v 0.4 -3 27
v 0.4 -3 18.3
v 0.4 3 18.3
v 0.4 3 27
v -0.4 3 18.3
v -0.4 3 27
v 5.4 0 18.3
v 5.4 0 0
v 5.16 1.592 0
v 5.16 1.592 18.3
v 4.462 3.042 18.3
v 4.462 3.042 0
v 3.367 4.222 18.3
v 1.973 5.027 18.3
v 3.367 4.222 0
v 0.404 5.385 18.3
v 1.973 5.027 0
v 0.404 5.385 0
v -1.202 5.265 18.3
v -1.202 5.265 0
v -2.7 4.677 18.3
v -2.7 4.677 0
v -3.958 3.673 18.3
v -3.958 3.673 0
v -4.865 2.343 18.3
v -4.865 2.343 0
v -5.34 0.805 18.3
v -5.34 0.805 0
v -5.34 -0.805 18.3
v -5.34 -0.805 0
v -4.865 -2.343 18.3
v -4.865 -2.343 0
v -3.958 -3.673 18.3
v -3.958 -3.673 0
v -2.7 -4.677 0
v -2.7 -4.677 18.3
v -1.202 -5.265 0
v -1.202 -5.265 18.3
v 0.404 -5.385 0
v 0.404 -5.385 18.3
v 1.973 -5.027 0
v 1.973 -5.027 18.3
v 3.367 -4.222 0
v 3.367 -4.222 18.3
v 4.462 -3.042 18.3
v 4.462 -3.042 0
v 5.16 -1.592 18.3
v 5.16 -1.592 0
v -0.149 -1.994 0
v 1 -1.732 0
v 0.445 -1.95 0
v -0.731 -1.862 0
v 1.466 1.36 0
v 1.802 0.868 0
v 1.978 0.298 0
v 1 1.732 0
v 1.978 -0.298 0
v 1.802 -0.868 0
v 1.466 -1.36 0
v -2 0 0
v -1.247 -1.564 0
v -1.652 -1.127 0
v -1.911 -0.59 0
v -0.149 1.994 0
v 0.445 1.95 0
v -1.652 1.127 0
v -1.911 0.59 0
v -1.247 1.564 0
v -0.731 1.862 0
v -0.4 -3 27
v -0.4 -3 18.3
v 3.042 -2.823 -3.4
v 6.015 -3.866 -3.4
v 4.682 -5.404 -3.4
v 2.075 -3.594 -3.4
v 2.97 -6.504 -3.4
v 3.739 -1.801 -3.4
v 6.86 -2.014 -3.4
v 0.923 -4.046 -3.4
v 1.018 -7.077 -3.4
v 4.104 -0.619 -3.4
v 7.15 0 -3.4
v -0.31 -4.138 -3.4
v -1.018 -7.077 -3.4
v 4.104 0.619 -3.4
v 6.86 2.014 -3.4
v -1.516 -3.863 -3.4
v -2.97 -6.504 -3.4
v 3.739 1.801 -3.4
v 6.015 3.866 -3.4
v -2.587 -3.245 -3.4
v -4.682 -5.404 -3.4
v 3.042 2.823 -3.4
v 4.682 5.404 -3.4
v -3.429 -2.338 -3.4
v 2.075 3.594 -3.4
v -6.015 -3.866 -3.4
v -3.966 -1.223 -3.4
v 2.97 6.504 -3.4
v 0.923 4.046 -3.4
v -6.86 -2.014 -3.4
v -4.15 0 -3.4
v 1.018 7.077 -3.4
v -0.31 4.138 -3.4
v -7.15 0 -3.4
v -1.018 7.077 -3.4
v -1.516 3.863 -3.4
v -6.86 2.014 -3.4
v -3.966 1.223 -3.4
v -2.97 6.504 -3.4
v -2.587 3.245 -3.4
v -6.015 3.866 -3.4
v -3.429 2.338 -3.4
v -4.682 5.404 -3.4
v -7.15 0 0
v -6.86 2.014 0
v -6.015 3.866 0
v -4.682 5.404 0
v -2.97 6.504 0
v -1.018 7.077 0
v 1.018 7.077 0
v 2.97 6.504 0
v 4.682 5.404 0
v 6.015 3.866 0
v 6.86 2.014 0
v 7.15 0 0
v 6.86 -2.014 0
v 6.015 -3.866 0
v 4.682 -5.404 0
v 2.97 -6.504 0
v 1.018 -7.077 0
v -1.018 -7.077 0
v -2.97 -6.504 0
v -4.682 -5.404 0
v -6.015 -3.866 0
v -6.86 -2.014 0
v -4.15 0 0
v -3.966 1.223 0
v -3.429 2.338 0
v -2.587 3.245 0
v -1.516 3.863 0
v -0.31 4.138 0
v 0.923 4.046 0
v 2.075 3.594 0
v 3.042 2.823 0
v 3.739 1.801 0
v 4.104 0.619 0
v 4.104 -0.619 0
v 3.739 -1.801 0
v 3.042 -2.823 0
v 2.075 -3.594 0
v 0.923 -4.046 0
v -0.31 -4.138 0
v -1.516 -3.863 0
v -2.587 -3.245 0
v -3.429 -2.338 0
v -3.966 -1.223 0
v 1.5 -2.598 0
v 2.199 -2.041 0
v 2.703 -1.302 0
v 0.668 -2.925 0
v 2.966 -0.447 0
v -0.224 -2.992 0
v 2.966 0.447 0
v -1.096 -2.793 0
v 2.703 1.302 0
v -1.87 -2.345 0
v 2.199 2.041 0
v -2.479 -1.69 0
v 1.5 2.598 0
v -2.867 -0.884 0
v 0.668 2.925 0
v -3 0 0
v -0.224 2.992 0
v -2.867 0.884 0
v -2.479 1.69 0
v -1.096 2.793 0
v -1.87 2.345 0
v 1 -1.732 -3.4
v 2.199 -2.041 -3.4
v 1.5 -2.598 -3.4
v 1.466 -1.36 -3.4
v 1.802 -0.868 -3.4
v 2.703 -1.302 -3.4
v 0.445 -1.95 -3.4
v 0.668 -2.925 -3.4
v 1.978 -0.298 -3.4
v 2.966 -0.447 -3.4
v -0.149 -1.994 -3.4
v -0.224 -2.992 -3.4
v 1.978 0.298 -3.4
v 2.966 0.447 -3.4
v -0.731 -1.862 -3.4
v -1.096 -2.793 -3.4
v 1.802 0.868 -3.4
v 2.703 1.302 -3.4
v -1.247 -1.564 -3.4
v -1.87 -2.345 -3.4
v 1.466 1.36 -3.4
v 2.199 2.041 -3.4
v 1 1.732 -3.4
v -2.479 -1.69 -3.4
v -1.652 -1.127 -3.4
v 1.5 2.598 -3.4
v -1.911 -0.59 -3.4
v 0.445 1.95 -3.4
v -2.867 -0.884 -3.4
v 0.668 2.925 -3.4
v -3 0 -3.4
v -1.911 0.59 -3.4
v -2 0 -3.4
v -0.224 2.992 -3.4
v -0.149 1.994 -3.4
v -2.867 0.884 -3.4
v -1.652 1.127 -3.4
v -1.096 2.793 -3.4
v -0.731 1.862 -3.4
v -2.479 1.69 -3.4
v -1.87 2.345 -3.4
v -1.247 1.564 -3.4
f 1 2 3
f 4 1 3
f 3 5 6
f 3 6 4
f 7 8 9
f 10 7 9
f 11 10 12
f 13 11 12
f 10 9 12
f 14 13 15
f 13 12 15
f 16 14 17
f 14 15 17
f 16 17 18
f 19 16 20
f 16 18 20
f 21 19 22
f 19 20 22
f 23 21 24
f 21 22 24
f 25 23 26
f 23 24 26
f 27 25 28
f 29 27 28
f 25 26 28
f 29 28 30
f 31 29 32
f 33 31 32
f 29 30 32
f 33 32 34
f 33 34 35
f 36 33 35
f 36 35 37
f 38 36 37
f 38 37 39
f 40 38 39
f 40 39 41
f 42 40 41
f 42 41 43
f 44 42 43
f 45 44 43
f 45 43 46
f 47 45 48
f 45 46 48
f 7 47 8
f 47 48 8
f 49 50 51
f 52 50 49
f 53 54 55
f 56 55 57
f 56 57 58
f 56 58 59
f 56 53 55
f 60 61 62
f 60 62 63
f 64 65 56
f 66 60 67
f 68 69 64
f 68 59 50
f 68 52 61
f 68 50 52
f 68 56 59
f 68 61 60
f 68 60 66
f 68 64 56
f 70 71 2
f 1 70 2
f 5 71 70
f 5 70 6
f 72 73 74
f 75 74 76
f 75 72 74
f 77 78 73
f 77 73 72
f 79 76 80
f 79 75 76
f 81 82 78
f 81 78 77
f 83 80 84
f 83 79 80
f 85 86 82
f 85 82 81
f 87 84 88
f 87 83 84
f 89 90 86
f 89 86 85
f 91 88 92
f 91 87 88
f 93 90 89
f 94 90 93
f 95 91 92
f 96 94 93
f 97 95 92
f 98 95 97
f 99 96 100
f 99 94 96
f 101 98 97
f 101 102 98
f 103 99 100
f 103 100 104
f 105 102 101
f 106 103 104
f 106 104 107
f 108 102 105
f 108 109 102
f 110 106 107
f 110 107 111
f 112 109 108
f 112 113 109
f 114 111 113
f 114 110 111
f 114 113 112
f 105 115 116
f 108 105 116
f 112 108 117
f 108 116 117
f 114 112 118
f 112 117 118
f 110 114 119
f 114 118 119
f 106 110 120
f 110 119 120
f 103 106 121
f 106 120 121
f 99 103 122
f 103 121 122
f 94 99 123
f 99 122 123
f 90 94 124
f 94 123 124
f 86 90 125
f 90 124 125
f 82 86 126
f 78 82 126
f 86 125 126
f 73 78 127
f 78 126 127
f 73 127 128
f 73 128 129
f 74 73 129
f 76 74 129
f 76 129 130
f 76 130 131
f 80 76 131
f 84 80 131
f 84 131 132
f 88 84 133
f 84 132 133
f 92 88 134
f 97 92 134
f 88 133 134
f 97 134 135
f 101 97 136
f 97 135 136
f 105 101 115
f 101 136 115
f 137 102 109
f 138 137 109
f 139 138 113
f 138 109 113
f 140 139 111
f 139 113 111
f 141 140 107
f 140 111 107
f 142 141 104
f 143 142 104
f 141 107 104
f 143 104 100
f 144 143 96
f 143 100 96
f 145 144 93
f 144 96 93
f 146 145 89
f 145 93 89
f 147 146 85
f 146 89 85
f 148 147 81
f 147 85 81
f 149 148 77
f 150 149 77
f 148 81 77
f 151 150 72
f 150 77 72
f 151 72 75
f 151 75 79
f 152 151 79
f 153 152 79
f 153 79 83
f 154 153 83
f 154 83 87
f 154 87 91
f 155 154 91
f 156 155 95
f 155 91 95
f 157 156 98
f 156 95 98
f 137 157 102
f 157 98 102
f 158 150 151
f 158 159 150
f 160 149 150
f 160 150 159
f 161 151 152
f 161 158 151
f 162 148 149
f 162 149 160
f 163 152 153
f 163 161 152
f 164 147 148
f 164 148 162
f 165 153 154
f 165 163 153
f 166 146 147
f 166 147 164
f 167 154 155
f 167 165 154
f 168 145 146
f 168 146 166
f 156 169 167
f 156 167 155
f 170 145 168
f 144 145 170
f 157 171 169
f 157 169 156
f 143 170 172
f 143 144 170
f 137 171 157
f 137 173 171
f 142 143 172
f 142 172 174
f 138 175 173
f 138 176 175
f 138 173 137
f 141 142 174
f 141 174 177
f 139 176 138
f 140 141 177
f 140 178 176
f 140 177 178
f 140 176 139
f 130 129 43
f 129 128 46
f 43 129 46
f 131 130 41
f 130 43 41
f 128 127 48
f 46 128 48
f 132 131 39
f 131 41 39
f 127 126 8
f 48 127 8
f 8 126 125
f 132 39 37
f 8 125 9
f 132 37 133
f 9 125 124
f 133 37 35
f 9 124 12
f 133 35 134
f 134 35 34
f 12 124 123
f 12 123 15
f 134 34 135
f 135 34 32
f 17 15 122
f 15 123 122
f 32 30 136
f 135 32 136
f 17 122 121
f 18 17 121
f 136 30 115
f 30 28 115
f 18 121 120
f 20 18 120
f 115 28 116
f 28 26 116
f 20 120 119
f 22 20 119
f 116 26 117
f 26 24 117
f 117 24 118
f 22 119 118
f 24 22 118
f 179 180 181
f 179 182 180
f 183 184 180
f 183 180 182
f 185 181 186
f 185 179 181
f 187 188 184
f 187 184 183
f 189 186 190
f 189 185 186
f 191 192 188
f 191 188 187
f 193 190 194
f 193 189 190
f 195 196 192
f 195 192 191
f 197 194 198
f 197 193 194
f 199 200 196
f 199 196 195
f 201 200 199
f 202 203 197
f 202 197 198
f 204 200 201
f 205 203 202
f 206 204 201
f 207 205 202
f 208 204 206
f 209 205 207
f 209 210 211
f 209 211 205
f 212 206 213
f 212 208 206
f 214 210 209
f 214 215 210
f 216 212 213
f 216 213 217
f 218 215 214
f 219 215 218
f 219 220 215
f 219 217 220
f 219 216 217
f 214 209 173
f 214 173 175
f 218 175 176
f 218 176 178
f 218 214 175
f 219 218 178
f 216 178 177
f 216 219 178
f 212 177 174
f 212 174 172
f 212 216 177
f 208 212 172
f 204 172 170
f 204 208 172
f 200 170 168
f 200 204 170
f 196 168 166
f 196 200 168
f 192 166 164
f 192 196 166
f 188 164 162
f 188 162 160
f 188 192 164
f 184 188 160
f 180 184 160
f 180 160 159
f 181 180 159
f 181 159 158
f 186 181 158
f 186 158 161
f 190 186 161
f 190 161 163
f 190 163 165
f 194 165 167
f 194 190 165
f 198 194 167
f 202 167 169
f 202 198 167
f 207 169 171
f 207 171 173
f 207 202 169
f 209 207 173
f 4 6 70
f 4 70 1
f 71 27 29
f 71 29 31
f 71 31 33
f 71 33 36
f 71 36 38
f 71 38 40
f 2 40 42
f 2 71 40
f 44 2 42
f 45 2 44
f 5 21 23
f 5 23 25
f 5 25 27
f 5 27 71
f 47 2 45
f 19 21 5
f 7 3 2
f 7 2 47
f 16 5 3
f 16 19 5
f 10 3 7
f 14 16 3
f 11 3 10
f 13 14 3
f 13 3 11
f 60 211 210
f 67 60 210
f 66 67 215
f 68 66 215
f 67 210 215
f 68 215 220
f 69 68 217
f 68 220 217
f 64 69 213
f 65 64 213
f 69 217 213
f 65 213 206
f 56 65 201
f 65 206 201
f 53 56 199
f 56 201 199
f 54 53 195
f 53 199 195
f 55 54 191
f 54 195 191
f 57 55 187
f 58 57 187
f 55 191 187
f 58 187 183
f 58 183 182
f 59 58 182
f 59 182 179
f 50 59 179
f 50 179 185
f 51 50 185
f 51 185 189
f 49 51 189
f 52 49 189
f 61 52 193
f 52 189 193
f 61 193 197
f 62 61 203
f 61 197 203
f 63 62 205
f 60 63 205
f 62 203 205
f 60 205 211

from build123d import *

# Parameters (mm, degrees)
ESQUISSE1_R             = 5.4
BOSS_EXTRU_1_DEPTH      = 18.3
ESQUISSE2_R             = 7.15
BOSS_EXTRU_3_DEPTH      = 3.4
ESQUISSE3_R             = 4.15
ESQUISSE3_R_2           = 3
ENL_V_MAT_EXTRU_1_DEPTH = 3.4
ESQUISSE5_R             = 2
ENL_V_MAT_EXTRU_2_DEPTH = 3.4
ESQUISSE6_W             = 0.8
ESQUISSE6_H             = 6
BOSS_EXTRU_4_DEPTH      = 8.7


with BuildPart() as part:
    # Esquisse1 → Boss.-Extru.1 (new body)
    with BuildSketch(Plane.XY):
        Circle(ESQUISSE1_R)
    extrude(amount=BOSS_EXTRU_1_DEPTH)

    # Esquisse2 → Boss.-Extru.3 (add)
    with BuildSketch(Plane(origin=(0, 0, 0), x_dir=(-1, 0, 0), z_dir=(0, 0, -1))):
        Circle(ESQUISSE2_R)
    extrude(amount=BOSS_EXTRU_3_DEPTH)

    # Esquisse3 → Enlèv. mat.-Extru.1 (cut)
    with BuildSketch(Plane(origin=(0, 0, -3.4), x_dir=(-1, 0, 0), z_dir=(0, 0, -1))):
        Circle(ESQUISSE3_R)
        Circle(ESQUISSE3_R_2, mode=Mode.SUBTRACT)
    extrude(amount=-ENL_V_MAT_EXTRU_1_DEPTH, mode=Mode.SUBTRACT)

    # Esquisse5 → Enlèv. mat.-Extru.2 (cut)
    with BuildSketch(Plane(origin=(0, 0, -3.4), x_dir=(-1, 0, 0), z_dir=(0, 0, -1))):
        Circle(ESQUISSE5_R)
    extrude(amount=-ENL_V_MAT_EXTRU_2_DEPTH, mode=Mode.SUBTRACT)

    # Esquisse6 → Boss.-Extru.4 (add)
    with BuildSketch(Plane.XY.offset(18.3)):
        Rectangle(ESQUISSE6_W, ESQUISSE6_H)
    extrude(amount=BOSS_EXTRU_4_DEPTH)


solid = part.part
